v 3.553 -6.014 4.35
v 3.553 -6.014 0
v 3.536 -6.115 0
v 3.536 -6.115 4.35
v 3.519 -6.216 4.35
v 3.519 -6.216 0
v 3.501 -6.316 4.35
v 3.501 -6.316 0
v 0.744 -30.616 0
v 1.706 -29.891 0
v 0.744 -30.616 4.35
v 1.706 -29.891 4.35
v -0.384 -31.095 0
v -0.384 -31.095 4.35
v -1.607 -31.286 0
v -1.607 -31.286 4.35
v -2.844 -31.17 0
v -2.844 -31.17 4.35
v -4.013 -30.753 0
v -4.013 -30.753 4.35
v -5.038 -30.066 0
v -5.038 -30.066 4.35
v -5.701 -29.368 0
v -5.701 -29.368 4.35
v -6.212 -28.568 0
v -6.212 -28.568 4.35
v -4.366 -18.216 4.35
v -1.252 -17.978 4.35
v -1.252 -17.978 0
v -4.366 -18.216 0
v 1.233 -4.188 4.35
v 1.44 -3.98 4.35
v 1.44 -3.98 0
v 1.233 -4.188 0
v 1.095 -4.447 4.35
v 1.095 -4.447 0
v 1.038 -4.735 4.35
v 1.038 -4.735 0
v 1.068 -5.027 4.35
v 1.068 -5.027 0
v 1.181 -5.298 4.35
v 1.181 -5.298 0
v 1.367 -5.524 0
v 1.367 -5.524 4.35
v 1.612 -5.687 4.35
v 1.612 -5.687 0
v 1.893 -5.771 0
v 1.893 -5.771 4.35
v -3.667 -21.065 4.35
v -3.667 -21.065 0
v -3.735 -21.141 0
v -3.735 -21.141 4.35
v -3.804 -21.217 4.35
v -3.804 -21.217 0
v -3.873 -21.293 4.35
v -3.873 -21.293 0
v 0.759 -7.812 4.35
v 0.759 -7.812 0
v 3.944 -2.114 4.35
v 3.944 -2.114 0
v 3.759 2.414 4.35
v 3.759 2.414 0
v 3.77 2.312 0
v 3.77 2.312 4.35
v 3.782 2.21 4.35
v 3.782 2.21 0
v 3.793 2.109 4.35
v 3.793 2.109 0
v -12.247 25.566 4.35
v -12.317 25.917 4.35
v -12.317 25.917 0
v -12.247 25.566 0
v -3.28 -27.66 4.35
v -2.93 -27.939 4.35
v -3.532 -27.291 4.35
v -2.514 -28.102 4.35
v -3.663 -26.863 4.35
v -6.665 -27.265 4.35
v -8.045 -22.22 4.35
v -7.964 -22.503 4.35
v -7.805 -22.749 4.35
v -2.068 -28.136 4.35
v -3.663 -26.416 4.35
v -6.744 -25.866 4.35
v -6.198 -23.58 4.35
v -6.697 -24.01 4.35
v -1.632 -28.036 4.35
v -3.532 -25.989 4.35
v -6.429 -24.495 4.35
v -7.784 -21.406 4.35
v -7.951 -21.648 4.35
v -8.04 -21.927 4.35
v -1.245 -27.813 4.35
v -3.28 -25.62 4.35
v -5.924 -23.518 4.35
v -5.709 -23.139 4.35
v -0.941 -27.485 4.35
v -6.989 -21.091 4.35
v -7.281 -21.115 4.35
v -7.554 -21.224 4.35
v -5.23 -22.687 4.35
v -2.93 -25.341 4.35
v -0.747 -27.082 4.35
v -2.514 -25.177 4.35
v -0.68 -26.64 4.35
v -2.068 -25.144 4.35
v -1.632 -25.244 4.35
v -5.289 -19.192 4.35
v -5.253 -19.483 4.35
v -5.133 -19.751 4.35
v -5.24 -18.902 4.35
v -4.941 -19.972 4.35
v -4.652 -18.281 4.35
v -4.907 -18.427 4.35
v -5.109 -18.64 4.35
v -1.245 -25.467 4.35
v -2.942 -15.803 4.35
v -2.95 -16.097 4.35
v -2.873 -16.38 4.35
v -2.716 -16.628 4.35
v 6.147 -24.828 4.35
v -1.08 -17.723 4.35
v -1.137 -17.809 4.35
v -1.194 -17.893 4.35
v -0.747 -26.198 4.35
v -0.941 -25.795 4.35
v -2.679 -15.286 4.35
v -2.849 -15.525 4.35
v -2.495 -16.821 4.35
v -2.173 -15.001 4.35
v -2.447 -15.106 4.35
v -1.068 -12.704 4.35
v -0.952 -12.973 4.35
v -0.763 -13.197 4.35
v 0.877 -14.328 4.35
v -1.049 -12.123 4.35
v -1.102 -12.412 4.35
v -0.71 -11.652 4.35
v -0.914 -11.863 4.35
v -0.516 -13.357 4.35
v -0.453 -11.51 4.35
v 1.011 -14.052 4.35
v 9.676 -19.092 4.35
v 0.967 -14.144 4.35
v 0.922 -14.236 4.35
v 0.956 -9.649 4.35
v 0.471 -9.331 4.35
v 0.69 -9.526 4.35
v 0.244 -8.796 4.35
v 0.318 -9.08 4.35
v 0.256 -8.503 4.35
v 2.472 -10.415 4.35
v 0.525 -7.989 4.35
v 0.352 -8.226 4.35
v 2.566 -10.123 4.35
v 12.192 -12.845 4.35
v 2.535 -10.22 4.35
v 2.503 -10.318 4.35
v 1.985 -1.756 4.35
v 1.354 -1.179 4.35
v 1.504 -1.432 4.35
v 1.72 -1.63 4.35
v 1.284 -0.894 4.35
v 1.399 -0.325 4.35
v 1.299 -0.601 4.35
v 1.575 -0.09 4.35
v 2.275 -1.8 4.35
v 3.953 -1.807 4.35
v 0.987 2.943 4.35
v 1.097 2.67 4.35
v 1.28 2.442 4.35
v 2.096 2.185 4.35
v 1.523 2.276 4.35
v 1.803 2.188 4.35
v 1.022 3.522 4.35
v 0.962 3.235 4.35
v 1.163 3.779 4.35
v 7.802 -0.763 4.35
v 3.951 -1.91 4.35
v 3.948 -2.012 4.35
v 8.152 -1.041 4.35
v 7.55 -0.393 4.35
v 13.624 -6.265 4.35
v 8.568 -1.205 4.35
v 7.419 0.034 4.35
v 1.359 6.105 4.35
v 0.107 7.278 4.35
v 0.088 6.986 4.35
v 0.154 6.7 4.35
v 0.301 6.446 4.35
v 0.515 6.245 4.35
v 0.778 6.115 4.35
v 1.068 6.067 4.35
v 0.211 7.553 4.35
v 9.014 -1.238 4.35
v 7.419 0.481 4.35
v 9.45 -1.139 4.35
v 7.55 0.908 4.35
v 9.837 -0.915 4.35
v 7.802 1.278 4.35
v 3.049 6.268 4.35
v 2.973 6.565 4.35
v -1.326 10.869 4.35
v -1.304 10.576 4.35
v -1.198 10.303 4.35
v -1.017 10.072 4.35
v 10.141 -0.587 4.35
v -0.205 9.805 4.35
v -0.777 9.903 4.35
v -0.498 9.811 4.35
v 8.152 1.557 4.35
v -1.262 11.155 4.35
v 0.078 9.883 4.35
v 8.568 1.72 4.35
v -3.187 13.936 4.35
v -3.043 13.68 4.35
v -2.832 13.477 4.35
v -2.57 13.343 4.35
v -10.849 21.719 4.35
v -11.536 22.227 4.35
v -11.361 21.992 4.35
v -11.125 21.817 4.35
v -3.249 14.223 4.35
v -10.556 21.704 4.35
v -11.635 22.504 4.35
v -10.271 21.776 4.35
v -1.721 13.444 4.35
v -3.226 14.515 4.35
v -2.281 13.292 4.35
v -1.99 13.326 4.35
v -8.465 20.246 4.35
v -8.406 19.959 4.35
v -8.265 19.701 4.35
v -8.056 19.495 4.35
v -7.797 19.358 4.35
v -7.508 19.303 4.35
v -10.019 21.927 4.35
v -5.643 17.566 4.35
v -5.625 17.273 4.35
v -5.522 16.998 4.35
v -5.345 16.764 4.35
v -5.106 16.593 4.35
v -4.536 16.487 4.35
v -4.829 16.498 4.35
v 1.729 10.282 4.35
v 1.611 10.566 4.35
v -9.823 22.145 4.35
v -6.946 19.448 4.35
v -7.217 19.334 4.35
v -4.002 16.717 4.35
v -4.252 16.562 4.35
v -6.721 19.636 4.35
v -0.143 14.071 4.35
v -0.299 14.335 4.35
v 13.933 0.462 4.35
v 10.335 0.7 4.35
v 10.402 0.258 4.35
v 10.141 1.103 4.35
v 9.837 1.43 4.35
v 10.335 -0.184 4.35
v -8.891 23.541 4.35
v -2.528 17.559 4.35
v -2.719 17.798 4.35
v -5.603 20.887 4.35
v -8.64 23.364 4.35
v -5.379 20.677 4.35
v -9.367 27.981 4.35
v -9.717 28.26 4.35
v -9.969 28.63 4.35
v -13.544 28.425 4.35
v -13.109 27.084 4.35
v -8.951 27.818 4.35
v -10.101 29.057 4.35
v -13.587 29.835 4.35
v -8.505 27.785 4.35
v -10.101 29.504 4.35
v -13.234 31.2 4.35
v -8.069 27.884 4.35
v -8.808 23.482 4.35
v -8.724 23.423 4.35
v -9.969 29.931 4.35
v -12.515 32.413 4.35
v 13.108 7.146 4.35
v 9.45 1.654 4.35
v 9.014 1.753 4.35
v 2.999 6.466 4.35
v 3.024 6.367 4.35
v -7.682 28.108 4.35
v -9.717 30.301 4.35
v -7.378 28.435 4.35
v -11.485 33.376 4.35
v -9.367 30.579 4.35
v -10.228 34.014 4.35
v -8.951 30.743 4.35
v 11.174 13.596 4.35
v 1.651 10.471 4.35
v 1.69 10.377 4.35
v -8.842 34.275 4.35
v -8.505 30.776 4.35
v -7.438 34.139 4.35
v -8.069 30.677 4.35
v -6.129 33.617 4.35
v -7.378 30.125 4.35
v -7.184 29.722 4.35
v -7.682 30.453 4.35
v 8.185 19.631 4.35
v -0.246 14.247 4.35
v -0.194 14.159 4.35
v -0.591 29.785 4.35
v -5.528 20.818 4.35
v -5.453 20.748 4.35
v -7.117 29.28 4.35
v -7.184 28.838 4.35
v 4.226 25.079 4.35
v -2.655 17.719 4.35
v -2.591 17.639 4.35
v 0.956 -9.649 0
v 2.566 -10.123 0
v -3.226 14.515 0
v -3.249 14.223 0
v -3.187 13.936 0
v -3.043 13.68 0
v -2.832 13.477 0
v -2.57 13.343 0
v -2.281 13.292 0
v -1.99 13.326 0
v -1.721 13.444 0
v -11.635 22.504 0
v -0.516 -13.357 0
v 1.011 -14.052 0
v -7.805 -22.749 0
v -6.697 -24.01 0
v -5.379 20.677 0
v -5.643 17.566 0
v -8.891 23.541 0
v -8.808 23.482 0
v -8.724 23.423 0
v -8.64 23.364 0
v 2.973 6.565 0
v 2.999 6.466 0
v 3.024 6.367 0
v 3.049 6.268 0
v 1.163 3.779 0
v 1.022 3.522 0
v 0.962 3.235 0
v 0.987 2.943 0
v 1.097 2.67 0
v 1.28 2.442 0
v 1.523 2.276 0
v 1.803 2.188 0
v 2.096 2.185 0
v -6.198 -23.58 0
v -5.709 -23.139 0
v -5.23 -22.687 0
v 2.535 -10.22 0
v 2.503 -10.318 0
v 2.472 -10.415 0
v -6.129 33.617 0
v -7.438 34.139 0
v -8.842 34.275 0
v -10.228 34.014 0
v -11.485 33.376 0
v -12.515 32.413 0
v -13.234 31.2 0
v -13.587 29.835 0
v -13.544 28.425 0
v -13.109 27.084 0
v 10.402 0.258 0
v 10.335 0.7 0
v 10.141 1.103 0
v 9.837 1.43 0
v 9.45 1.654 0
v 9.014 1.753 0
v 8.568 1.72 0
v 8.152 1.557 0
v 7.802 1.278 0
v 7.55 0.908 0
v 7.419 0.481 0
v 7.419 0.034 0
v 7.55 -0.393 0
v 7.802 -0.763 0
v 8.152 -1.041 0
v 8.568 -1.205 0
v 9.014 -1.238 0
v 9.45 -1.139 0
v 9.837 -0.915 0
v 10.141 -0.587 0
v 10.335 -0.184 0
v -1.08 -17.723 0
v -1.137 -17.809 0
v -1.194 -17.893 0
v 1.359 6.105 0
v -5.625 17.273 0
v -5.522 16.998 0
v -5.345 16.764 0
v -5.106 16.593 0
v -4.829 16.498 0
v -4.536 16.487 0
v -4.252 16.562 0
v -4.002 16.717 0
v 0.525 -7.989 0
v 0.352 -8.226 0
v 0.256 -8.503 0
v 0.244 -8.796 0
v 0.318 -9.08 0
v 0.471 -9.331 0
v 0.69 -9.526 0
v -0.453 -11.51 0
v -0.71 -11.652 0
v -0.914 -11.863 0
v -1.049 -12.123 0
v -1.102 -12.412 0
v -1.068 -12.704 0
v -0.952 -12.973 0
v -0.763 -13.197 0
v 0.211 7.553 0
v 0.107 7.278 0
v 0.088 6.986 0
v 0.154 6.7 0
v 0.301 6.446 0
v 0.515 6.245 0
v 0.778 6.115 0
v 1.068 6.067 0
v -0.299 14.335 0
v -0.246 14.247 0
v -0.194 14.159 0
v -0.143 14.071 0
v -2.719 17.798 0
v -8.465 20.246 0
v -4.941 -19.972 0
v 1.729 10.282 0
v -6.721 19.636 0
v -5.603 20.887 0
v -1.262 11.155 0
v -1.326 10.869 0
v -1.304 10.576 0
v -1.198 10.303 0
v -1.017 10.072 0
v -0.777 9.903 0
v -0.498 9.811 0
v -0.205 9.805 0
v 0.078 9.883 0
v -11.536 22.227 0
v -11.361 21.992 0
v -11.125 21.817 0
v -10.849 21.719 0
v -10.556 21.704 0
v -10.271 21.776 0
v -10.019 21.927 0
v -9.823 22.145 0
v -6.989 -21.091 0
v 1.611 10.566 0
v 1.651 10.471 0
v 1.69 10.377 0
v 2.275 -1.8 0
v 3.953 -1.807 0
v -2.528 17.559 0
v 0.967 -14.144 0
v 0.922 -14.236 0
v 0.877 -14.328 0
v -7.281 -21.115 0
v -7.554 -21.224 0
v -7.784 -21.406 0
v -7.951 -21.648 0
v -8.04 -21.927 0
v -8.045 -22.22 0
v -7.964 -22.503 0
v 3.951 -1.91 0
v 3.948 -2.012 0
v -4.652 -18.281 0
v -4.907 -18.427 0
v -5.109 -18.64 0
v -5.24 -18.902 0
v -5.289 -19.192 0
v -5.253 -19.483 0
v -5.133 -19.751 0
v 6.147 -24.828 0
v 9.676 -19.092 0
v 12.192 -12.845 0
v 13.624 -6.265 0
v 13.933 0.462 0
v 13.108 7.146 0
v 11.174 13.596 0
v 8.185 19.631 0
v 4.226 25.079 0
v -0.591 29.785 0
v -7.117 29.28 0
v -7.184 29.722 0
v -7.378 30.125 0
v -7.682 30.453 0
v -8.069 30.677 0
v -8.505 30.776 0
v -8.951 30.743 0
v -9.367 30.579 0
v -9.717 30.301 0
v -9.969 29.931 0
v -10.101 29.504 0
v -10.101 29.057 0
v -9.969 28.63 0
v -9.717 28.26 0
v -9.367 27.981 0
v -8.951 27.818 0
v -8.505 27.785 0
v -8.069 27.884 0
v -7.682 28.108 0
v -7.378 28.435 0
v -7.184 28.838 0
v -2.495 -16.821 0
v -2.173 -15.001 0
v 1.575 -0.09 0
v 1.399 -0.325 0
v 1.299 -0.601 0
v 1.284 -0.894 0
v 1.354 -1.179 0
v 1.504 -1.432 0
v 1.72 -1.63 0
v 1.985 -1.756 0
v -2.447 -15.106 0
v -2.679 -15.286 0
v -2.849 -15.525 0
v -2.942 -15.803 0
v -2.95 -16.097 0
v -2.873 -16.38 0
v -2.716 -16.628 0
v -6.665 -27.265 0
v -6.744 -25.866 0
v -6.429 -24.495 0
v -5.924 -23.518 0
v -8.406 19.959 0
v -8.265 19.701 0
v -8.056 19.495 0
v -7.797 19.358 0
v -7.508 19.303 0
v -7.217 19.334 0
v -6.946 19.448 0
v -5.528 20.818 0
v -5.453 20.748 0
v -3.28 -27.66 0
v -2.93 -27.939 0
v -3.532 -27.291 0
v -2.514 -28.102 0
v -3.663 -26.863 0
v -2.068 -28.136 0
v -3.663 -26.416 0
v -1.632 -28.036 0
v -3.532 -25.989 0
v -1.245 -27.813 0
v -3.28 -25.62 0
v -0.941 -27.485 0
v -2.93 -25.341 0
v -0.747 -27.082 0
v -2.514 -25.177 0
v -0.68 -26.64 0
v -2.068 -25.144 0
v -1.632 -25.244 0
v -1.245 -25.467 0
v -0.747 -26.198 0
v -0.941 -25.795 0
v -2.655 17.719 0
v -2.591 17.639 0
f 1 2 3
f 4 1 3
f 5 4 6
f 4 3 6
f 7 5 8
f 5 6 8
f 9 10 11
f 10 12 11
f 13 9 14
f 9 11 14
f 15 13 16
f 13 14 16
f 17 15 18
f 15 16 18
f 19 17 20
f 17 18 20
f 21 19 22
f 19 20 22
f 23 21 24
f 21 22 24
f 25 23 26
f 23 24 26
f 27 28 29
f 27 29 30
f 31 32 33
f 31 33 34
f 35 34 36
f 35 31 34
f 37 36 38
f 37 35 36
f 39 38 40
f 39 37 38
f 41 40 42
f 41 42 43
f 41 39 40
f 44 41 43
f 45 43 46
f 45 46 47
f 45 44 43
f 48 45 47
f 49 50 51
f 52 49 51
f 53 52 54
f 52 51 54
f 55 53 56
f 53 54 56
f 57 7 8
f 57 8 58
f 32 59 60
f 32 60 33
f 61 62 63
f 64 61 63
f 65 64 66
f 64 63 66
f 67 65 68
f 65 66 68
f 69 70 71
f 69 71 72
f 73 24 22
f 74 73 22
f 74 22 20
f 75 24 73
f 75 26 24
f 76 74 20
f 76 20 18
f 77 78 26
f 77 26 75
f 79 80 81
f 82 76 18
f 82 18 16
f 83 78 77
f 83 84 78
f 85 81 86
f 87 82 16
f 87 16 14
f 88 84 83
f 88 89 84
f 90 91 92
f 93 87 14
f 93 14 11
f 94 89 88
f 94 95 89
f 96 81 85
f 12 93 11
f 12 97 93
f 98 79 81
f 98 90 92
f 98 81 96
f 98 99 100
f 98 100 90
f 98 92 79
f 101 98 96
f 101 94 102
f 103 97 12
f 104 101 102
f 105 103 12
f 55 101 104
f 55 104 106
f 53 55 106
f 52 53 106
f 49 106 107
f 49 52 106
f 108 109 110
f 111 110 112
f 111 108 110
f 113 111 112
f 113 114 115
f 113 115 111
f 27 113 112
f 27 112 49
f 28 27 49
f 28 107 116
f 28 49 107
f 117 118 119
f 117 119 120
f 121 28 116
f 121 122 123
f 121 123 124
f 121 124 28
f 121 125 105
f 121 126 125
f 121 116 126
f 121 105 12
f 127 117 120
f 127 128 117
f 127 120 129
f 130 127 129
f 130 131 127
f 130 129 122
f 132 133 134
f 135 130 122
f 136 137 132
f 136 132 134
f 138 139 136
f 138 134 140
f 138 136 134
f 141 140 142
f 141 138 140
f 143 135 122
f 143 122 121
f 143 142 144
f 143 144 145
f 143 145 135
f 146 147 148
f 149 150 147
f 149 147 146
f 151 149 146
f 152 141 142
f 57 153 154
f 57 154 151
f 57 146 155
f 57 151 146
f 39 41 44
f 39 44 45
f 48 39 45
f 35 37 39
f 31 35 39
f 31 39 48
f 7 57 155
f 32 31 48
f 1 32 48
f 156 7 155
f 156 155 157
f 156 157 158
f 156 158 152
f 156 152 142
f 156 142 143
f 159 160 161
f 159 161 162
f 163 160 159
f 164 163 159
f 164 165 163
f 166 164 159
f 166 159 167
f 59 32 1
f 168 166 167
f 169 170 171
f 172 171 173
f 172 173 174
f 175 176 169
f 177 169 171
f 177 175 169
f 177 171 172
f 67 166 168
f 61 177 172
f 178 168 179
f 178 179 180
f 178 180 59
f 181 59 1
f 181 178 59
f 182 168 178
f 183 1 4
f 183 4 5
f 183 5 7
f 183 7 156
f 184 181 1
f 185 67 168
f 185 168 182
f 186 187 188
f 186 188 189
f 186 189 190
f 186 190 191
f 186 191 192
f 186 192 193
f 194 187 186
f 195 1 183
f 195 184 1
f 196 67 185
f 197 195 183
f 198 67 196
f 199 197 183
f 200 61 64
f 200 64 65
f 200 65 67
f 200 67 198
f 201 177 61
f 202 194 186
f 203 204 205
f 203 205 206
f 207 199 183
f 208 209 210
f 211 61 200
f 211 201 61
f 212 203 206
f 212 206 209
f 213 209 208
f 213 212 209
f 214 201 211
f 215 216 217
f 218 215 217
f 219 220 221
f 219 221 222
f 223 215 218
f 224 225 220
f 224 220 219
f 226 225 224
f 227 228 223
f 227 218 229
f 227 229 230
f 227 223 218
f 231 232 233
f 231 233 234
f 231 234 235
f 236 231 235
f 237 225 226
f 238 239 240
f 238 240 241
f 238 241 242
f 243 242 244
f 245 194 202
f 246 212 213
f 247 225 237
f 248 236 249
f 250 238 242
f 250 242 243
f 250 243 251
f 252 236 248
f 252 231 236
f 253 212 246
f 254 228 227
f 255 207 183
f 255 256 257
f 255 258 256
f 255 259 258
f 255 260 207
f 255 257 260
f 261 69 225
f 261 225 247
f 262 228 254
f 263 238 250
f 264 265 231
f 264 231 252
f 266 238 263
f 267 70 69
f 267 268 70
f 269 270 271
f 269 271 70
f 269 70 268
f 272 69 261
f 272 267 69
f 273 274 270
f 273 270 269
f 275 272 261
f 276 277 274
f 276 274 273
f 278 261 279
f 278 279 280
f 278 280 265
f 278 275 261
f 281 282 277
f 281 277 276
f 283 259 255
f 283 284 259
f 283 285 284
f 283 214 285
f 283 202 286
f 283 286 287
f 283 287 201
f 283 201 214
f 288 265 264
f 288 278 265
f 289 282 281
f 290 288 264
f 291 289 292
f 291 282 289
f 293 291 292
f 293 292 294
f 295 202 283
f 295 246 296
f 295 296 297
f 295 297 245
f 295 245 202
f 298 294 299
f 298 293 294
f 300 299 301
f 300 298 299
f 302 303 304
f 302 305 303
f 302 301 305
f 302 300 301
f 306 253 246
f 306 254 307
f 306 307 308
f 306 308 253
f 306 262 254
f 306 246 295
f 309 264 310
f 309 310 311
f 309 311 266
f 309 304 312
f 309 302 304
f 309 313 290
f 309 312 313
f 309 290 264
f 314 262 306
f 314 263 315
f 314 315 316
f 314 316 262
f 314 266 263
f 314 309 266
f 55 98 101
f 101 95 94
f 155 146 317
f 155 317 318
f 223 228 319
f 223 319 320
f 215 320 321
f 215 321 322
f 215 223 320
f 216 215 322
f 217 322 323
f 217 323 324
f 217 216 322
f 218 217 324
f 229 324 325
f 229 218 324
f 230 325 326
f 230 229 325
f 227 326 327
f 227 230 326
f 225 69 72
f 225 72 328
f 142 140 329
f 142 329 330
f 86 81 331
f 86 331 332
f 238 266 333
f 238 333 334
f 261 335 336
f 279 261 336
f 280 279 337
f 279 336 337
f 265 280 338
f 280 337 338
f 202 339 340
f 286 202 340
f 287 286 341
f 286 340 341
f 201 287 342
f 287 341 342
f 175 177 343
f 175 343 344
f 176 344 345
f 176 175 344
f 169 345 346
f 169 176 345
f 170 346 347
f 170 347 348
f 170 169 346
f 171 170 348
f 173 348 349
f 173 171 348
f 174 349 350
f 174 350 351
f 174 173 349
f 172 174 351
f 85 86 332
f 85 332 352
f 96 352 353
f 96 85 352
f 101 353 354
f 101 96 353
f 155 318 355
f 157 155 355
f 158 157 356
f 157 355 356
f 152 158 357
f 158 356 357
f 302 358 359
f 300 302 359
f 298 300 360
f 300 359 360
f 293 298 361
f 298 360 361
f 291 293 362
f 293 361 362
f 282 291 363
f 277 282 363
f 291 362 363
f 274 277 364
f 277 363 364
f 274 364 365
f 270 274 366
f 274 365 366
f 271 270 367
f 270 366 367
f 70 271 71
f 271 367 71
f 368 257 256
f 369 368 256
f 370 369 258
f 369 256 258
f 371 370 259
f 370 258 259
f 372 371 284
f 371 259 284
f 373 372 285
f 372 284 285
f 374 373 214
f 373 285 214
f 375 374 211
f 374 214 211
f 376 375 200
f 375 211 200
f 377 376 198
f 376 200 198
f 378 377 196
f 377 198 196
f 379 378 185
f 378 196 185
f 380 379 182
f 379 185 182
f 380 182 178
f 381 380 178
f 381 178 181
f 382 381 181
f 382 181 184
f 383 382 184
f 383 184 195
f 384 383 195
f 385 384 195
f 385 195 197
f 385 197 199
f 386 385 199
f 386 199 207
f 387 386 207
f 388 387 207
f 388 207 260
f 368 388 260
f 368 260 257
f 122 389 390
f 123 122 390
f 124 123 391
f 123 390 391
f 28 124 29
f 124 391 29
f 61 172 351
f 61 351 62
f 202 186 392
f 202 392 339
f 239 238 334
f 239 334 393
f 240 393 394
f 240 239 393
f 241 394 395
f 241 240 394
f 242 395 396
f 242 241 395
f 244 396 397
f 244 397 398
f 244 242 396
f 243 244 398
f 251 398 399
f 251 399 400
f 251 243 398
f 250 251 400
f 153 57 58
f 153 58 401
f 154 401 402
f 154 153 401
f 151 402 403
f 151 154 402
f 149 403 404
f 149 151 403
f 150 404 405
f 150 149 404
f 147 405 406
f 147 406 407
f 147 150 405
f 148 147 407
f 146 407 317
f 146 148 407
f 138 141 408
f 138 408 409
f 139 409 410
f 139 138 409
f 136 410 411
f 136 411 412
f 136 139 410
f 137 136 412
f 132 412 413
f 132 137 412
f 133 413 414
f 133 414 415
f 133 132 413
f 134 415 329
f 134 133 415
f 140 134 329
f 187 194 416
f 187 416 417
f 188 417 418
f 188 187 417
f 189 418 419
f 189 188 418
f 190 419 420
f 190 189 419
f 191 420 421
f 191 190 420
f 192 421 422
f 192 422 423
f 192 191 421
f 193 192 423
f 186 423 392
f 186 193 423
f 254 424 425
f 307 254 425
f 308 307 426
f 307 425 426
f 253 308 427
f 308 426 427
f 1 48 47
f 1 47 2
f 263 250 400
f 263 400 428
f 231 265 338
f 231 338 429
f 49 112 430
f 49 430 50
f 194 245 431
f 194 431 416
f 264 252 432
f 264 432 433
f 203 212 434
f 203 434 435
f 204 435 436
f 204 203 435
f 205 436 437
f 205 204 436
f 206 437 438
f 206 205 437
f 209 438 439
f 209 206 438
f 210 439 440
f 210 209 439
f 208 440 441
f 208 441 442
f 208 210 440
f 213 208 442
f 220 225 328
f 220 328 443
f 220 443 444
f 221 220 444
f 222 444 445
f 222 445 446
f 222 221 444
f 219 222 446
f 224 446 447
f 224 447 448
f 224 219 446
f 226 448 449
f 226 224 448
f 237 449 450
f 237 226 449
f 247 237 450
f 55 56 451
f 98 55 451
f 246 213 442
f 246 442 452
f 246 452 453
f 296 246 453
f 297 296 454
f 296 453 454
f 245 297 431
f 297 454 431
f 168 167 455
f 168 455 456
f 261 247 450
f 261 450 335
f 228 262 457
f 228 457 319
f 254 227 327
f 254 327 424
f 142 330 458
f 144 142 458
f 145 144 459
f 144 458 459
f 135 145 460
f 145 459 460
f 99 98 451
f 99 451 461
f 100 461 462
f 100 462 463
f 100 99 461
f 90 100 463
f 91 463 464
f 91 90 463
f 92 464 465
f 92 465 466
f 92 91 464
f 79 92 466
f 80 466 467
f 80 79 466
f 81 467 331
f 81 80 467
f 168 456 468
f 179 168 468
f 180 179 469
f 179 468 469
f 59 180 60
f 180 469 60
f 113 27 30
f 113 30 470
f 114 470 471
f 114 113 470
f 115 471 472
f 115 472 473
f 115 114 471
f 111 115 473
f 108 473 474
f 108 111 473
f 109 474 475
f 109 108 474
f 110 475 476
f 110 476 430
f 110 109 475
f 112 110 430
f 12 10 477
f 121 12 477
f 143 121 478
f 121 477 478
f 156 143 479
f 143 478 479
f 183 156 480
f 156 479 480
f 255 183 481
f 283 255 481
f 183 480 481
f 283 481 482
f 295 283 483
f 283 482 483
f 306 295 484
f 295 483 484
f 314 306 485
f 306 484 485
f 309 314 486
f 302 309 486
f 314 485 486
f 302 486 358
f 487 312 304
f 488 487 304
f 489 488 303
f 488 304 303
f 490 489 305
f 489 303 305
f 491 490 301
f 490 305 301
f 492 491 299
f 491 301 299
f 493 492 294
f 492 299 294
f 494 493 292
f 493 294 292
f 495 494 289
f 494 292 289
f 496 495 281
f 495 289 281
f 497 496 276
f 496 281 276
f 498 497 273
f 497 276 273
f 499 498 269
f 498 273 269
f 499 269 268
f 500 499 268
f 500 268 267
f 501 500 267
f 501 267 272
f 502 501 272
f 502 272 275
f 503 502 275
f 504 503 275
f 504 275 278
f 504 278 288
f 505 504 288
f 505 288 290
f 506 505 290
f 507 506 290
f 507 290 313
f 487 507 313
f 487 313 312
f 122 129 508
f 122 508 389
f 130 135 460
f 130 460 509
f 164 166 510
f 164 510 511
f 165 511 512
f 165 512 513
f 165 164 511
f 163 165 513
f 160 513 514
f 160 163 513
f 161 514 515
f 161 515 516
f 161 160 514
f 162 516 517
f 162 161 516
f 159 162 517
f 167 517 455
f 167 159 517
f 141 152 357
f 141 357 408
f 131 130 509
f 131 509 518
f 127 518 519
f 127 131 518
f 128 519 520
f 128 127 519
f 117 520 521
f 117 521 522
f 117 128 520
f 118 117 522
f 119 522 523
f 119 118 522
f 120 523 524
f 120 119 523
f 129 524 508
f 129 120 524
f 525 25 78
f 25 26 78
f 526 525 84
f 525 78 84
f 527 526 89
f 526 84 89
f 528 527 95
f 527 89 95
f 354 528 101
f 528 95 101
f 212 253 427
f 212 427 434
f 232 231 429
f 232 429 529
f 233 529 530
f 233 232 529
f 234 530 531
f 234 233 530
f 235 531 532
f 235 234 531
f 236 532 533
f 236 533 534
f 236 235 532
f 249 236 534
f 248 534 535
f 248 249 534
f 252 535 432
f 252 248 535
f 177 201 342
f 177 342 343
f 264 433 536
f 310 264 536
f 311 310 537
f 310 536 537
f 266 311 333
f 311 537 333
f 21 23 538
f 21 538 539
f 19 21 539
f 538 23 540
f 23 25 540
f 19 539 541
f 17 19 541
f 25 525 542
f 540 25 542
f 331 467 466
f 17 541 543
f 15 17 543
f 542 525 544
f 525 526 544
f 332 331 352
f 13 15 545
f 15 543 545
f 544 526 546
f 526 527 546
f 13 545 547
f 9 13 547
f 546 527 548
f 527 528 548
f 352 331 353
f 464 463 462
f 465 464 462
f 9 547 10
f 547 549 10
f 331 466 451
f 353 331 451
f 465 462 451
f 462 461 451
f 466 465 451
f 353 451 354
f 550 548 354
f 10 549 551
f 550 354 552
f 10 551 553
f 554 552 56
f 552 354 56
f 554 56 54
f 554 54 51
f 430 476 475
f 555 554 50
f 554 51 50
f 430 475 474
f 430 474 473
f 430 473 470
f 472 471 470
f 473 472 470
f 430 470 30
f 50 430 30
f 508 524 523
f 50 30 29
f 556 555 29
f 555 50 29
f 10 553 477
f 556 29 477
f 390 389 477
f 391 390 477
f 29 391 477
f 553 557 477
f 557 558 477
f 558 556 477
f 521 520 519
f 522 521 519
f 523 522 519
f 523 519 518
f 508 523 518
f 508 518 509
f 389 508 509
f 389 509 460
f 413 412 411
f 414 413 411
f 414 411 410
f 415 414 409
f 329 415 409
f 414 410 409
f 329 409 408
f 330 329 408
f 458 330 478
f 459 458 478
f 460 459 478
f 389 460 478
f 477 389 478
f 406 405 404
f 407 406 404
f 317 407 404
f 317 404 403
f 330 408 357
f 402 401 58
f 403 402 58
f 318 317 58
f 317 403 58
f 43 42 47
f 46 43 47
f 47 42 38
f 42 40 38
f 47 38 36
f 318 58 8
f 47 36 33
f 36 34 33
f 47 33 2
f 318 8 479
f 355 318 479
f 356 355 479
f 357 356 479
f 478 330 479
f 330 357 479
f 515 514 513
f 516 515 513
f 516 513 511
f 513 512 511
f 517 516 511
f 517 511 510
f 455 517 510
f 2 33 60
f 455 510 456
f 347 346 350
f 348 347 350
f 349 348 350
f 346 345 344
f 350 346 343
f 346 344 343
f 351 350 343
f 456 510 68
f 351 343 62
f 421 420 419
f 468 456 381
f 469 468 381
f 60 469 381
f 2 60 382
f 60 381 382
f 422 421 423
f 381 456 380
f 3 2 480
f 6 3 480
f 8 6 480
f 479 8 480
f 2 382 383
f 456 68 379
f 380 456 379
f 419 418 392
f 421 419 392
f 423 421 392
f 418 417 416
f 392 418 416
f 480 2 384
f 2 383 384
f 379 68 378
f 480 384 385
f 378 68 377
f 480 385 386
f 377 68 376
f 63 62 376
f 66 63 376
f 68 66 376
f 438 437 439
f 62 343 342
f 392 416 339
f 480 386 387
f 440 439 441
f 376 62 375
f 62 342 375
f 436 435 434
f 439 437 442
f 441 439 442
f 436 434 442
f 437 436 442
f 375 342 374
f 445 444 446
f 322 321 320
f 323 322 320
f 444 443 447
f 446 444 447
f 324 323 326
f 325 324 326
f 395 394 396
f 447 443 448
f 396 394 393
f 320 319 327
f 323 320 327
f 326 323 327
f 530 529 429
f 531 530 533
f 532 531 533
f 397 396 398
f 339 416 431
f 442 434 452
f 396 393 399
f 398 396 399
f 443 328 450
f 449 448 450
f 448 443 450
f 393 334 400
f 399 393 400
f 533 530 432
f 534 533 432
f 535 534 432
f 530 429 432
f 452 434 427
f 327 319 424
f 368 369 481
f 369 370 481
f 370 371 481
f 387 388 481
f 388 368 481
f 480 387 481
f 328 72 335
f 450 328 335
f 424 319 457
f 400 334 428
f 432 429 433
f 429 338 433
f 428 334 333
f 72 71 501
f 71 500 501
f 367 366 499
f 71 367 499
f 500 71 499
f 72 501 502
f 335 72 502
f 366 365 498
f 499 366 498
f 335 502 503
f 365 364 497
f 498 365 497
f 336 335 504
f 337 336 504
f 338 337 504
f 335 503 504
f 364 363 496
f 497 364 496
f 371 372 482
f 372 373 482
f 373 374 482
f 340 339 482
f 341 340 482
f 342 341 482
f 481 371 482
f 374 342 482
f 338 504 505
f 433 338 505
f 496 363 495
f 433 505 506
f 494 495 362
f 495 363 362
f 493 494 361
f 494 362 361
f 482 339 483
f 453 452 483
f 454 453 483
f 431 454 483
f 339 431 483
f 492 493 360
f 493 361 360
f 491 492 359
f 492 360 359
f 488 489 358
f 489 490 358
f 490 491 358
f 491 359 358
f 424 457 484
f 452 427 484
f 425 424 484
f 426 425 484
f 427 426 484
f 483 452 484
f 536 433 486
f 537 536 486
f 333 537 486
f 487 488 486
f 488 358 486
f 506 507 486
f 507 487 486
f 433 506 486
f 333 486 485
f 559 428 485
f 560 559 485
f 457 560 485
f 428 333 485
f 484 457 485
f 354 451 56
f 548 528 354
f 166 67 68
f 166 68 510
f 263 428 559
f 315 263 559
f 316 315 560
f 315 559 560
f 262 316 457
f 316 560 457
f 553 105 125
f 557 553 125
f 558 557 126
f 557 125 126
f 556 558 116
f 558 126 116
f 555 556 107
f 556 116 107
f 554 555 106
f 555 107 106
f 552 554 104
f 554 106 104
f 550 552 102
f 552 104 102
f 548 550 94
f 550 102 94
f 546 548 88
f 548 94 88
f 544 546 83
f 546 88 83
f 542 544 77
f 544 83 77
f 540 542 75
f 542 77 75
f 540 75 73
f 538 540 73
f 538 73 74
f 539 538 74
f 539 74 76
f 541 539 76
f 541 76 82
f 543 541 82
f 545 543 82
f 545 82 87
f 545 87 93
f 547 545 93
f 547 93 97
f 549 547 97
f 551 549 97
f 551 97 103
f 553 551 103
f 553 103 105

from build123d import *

# Parameters (mm, degrees)
BOSS_EXTRU_1_DEPTH      = 4.35
ENL_V_MAT_EXTRU_1_DEPTH = 38.269393438
CONG_3_R                = 5
ESQUISSE3_R             = 1.5
ENL_V_MAT_EXTRU_2_DEPTH = 38.269393579
BOSS_EXTRU_2_DEPTH      = 4.35


with BuildPart() as part:
    # Esquisse1 → Boss.-Extru.1 (new body)
    with BuildSketch(Plane.XY):
        with BuildLine():
            Line((-13.183298291, -31.679408844), (-0.713739606, -32.039150948))
            ThreePointArc((-0.713739606, -32.039150948), (13.826896651, 2.211449904), (-6.128687986, 33.616997237))
            ThreePointArc((-6.128687986, 33.616997237), (-12.95399094, 31.768960554), (-11.105954257, 24.9436576))
            ThreePointArc((-11.105954257, 24.9436576), (3.84132079, 1.61453914), (-6.69721834, -24.00982412))
            ThreePointArc((-6.69721834, -24.00982412), (-10.263527106, -27.571231769), (-13.183298291, -31.679408844))
        make_face()
    extrude(amount=BOSS_EXTRU_1_DEPTH)

    # Esquisse2 → Enlèv. mat.-Extru.1 (cut, through all)
    with BuildSketch(Plane(origin=(0, 0, 0), x_dir=(-1, 0, 0), z_dir=(0, 0, -1))):
        with BuildLine():
            Line((13.183298291, -31.679408844), (0.713739606, -32.039150948))
            ThreePointArc((0.713739606, -32.039150948), (5.648573529, -29.472487497), (6.69721834, -24.00982412))
            ThreePointArc((6.69721834, -24.00982412), (10.263527106, -27.571231769), (13.183298291, -31.679408844))
        make_face()
    extrude(amount=-ENL_V_MAT_EXTRU_1_DEPTH, mode=Mode.SUBTRACT)

    # Congé3
    cong_3_edges = [part.edges().sort_by_distance(p)[0] for p in [
        (-0.713739606, -32.039150948, 2.175),
        (-6.69721834, -24.00982412, 2.175),
    ]]
    fillet(cong_3_edges, radius=CONG_3_R - 0.0001)  # a hair under: the kernel refuses the full size

    # Esquisse3 → Enlèv. mat.-Extru.2 (cut, through all)
    with BuildSketch(Plane.XY.offset(4.35)):
        with Locations((-8.617321121, 29.280327419)):
            Circle(ESQUISSE3_R)
        with Locations((8.901780596, 0.257662949)):
            Circle(ESQUISSE3_R)
        with Locations((-2.180082362, -26.639815256)):
            Circle(ESQUISSE3_R)
    extrude(amount=-ENL_V_MAT_EXTRU_2_DEPTH, mode=Mode.SUBTRACT)

    # Esquisse4 → Boss.-Extru.2 (add, through all)
    with BuildSketch(Plane.XY.offset(4.35)):
        with BuildLine():
            Line((-9.822535933, 22.144666991), (-8.891427789, 23.540777623))
            ThreePointArc((-8.891427789, 23.540777623), (-9.983360232, 24.266418144), (-11.105954257, 24.9436576))
            ThreePointArc((-11.105954257, 24.9436576), (-11.749605725, 25.383047193), (-12.317161418, 25.917117378))
            Line((-12.317161418, 25.917117378), (-12.247003841, 25.565996611))
            Line((-12.247003841, 25.565996611), (-11.635101494, 22.503581534))
            ThreePointArc((-11.635101494, 22.503581534), (-10.848728229, 21.718565469), (-9.822535933, 22.144666991))
        make_face()
        with BuildLine():
            Line((-6.720773728, 19.63604394), (-5.602744878, 20.887482618))
            ThreePointArc((-5.602744878, 20.887482618), (-7.081127932, 22.175442131), (-8.640486445, 23.364078822))
            Line((-8.640486445, 23.364078822), (-8.464930853, 20.246068108))
            ThreePointArc((-8.464930853, 20.246068108), (-7.796654849, 19.358351758), (-6.720773728, 19.63604394))
        make_face()
        with BuildLine():
            Line((-4.002247722, 16.716500355), (-2.719479126, 17.798439356))
            ThreePointArc((-2.719479126, 17.798439356), (-4.002235611, 19.281339204), (-5.379119408, 20.677278733))
            Line((-5.379119408, 20.677278733), (-5.643393478, 17.565531668))
            ThreePointArc((-5.643393478, 17.565531668), (-5.106472893, 16.592726743), (-4.002247722, 16.716500355))
        make_face()
        with BuildLine():
            Line((-1.720891689, 13.443958065), (-0.298832635, 14.33493243))
            ThreePointArc((-0.298832635, 14.33493243), (-1.360513504, 15.983352852), (-2.527606113, 17.558900694))
            Line((-2.527606113, 17.558900694), (-3.22646682, 14.515152299))
            ThreePointArc((-3.22646682, 14.515152299), (-2.831553807, 13.476558611), (-1.720891689, 13.443958065))
        make_face()
        with BuildLine():
            Line((0.078033764, 9.883342162), (1.611170559, 10.565675544))
            ThreePointArc((1.611170559, 10.565675544), (0.791628357, 12.346912961), (-0.142518712, 14.07081128))
            Line((-0.142518712, 14.07081128), (-1.262101119, 11.155447526))
            ThreePointArc((-1.262101119, 11.155447526), (-1.017030492, 10.071670094), (0.078033764, 9.883342162))
        make_face()
        with BuildLine():
            Line((1.358839136, 6.105292932), (2.972637242, 6.565448283))
            ThreePointArc((2.972637242, 6.565448283), (2.411492888, 8.444164113), (1.728824224, 10.282211897))
            Line((1.728824224, 10.282211897), (0.210731898, 7.553071689))
            ThreePointArc((0.210731898, 7.553071689), (0.301098098, 6.445611945), (1.358839136, 6.105292932))
        make_face()
        with BuildLine():
            Line((2.096114089, 2.184764392), (3.758556811, 2.413612532))
            ThreePointArc((3.758556811, 2.413612532), (3.46694304, 4.352534286), (3.04929648, 6.268265872))
            Line((3.04929648, 6.268265872), (1.16281219, 3.779493562))
            ThreePointArc((1.16281219, 3.779493562), (1.096681157, 2.670322781), (2.096114089, 2.184764392))
        make_face()
        with BuildLine():
            Line((2.275231572, -1.800462743), (3.953337136, -1.807462011))
            ThreePointArc((3.953337136, -1.807462011), (3.937039374, 0.15319873), (3.792700751, 2.108607261))
            Line((3.792700751, 2.108607261), (1.575251109, -0.090421541))
            ThreePointArc((1.575251109, -0.090421541), (1.35393484, -1.179298138), (2.275231572, -1.800462743))
        make_face()
        with BuildLine():
            Line((0.955923809, -9.649040634), (2.565827278, -10.122641832))
            ThreePointArc((2.565827278, -10.122641832), (3.095663042, -8.234857357), (3.501051982, -6.316494523))
            Line((3.501051982, -6.316494523), (0.759343223, -7.811768298))
            ThreePointArc((0.759343223, -7.811768298), (0.243820453, -8.79607994), (0.955923809, -9.649040634))
        make_face()
        with BuildLine():
            Line((1.89263801, -5.771324181), (3.553113903, -6.014031995))
            ThreePointArc((3.553113903, -6.014031995), (3.812455487, -4.07053049), (3.944288385, -2.114239038))
            Line((3.944288385, -2.114239038), (1.439866137, -3.979897042))
            ThreePointArc((1.439866137, -3.979897042), (1.067755401, -5.026876858), (1.89263801, -5.771324181))
        make_face()
        with BuildLine():
            Line((-0.516327235, -13.356680753), (1.011064381, -14.051779397))
            ThreePointArc((1.011064381, -14.051779397), (1.80088273, -12.257164359), (2.471785062, -10.414789202))
            Line((2.471785062, -10.414789202), (-0.452816504, -11.510013499))
            ThreePointArc((-0.452816504, -11.510013499), (-1.101523675, -12.412128869), (-0.516327235, -13.356680753))
        make_face()
        with BuildLine():
            Line((-2.494906628, -16.820687389), (-1.080329313, -17.723493178))
            ThreePointArc((-1.080329313, -17.723493178), (-0.046197856, -16.057651562), (0.876907606, -14.327815597))
            Line((0.876907606, -14.327815597), (-2.172564591, -15.001261883))
            ThreePointArc((-2.172564591, -15.001261883), (-2.941586238, -15.803283605), (-2.494906628, -16.820687389))
        make_face()
        with BuildLine():
            Line((-4.940560652, -19.972336923), (-3.666861923, -21.064938782))
            ThreePointArc((-3.666861923, -21.064938782), (-2.40893385, -19.560919792), (-1.251939064, -17.977941831))
            Line((-1.251939064, -17.977941831), (-4.365782364, -18.216249374))
            ThreePointArc((-4.365782364, -18.216249374), (-5.239861602, -18.902265862), (-4.940560652, -19.972336923))
        make_face()
        with BuildLine():
            ThreePointArc((-5.229503112, -22.686931264), (-4.539706777, -22.000844712), (-3.872520027, -21.292751794))
            Line((-3.872520027, -21.292751794), (-6.988957821, -21.091192728))
            ThreePointArc((-6.988957821, -21.091192728), (-7.95075349, -21.647593865), (-7.804769136, -22.749102695))
            Line((-7.804769136, -22.749102695), (-6.69721834, -24.00982412))
            ThreePointArc((-6.69721834, -24.00982412), (-5.952466431, -23.360464628), (-5.229503112, -22.686931264))
        make_face()
    extrude(amount=-BOSS_EXTRU_2_DEPTH)


solid = part.part
